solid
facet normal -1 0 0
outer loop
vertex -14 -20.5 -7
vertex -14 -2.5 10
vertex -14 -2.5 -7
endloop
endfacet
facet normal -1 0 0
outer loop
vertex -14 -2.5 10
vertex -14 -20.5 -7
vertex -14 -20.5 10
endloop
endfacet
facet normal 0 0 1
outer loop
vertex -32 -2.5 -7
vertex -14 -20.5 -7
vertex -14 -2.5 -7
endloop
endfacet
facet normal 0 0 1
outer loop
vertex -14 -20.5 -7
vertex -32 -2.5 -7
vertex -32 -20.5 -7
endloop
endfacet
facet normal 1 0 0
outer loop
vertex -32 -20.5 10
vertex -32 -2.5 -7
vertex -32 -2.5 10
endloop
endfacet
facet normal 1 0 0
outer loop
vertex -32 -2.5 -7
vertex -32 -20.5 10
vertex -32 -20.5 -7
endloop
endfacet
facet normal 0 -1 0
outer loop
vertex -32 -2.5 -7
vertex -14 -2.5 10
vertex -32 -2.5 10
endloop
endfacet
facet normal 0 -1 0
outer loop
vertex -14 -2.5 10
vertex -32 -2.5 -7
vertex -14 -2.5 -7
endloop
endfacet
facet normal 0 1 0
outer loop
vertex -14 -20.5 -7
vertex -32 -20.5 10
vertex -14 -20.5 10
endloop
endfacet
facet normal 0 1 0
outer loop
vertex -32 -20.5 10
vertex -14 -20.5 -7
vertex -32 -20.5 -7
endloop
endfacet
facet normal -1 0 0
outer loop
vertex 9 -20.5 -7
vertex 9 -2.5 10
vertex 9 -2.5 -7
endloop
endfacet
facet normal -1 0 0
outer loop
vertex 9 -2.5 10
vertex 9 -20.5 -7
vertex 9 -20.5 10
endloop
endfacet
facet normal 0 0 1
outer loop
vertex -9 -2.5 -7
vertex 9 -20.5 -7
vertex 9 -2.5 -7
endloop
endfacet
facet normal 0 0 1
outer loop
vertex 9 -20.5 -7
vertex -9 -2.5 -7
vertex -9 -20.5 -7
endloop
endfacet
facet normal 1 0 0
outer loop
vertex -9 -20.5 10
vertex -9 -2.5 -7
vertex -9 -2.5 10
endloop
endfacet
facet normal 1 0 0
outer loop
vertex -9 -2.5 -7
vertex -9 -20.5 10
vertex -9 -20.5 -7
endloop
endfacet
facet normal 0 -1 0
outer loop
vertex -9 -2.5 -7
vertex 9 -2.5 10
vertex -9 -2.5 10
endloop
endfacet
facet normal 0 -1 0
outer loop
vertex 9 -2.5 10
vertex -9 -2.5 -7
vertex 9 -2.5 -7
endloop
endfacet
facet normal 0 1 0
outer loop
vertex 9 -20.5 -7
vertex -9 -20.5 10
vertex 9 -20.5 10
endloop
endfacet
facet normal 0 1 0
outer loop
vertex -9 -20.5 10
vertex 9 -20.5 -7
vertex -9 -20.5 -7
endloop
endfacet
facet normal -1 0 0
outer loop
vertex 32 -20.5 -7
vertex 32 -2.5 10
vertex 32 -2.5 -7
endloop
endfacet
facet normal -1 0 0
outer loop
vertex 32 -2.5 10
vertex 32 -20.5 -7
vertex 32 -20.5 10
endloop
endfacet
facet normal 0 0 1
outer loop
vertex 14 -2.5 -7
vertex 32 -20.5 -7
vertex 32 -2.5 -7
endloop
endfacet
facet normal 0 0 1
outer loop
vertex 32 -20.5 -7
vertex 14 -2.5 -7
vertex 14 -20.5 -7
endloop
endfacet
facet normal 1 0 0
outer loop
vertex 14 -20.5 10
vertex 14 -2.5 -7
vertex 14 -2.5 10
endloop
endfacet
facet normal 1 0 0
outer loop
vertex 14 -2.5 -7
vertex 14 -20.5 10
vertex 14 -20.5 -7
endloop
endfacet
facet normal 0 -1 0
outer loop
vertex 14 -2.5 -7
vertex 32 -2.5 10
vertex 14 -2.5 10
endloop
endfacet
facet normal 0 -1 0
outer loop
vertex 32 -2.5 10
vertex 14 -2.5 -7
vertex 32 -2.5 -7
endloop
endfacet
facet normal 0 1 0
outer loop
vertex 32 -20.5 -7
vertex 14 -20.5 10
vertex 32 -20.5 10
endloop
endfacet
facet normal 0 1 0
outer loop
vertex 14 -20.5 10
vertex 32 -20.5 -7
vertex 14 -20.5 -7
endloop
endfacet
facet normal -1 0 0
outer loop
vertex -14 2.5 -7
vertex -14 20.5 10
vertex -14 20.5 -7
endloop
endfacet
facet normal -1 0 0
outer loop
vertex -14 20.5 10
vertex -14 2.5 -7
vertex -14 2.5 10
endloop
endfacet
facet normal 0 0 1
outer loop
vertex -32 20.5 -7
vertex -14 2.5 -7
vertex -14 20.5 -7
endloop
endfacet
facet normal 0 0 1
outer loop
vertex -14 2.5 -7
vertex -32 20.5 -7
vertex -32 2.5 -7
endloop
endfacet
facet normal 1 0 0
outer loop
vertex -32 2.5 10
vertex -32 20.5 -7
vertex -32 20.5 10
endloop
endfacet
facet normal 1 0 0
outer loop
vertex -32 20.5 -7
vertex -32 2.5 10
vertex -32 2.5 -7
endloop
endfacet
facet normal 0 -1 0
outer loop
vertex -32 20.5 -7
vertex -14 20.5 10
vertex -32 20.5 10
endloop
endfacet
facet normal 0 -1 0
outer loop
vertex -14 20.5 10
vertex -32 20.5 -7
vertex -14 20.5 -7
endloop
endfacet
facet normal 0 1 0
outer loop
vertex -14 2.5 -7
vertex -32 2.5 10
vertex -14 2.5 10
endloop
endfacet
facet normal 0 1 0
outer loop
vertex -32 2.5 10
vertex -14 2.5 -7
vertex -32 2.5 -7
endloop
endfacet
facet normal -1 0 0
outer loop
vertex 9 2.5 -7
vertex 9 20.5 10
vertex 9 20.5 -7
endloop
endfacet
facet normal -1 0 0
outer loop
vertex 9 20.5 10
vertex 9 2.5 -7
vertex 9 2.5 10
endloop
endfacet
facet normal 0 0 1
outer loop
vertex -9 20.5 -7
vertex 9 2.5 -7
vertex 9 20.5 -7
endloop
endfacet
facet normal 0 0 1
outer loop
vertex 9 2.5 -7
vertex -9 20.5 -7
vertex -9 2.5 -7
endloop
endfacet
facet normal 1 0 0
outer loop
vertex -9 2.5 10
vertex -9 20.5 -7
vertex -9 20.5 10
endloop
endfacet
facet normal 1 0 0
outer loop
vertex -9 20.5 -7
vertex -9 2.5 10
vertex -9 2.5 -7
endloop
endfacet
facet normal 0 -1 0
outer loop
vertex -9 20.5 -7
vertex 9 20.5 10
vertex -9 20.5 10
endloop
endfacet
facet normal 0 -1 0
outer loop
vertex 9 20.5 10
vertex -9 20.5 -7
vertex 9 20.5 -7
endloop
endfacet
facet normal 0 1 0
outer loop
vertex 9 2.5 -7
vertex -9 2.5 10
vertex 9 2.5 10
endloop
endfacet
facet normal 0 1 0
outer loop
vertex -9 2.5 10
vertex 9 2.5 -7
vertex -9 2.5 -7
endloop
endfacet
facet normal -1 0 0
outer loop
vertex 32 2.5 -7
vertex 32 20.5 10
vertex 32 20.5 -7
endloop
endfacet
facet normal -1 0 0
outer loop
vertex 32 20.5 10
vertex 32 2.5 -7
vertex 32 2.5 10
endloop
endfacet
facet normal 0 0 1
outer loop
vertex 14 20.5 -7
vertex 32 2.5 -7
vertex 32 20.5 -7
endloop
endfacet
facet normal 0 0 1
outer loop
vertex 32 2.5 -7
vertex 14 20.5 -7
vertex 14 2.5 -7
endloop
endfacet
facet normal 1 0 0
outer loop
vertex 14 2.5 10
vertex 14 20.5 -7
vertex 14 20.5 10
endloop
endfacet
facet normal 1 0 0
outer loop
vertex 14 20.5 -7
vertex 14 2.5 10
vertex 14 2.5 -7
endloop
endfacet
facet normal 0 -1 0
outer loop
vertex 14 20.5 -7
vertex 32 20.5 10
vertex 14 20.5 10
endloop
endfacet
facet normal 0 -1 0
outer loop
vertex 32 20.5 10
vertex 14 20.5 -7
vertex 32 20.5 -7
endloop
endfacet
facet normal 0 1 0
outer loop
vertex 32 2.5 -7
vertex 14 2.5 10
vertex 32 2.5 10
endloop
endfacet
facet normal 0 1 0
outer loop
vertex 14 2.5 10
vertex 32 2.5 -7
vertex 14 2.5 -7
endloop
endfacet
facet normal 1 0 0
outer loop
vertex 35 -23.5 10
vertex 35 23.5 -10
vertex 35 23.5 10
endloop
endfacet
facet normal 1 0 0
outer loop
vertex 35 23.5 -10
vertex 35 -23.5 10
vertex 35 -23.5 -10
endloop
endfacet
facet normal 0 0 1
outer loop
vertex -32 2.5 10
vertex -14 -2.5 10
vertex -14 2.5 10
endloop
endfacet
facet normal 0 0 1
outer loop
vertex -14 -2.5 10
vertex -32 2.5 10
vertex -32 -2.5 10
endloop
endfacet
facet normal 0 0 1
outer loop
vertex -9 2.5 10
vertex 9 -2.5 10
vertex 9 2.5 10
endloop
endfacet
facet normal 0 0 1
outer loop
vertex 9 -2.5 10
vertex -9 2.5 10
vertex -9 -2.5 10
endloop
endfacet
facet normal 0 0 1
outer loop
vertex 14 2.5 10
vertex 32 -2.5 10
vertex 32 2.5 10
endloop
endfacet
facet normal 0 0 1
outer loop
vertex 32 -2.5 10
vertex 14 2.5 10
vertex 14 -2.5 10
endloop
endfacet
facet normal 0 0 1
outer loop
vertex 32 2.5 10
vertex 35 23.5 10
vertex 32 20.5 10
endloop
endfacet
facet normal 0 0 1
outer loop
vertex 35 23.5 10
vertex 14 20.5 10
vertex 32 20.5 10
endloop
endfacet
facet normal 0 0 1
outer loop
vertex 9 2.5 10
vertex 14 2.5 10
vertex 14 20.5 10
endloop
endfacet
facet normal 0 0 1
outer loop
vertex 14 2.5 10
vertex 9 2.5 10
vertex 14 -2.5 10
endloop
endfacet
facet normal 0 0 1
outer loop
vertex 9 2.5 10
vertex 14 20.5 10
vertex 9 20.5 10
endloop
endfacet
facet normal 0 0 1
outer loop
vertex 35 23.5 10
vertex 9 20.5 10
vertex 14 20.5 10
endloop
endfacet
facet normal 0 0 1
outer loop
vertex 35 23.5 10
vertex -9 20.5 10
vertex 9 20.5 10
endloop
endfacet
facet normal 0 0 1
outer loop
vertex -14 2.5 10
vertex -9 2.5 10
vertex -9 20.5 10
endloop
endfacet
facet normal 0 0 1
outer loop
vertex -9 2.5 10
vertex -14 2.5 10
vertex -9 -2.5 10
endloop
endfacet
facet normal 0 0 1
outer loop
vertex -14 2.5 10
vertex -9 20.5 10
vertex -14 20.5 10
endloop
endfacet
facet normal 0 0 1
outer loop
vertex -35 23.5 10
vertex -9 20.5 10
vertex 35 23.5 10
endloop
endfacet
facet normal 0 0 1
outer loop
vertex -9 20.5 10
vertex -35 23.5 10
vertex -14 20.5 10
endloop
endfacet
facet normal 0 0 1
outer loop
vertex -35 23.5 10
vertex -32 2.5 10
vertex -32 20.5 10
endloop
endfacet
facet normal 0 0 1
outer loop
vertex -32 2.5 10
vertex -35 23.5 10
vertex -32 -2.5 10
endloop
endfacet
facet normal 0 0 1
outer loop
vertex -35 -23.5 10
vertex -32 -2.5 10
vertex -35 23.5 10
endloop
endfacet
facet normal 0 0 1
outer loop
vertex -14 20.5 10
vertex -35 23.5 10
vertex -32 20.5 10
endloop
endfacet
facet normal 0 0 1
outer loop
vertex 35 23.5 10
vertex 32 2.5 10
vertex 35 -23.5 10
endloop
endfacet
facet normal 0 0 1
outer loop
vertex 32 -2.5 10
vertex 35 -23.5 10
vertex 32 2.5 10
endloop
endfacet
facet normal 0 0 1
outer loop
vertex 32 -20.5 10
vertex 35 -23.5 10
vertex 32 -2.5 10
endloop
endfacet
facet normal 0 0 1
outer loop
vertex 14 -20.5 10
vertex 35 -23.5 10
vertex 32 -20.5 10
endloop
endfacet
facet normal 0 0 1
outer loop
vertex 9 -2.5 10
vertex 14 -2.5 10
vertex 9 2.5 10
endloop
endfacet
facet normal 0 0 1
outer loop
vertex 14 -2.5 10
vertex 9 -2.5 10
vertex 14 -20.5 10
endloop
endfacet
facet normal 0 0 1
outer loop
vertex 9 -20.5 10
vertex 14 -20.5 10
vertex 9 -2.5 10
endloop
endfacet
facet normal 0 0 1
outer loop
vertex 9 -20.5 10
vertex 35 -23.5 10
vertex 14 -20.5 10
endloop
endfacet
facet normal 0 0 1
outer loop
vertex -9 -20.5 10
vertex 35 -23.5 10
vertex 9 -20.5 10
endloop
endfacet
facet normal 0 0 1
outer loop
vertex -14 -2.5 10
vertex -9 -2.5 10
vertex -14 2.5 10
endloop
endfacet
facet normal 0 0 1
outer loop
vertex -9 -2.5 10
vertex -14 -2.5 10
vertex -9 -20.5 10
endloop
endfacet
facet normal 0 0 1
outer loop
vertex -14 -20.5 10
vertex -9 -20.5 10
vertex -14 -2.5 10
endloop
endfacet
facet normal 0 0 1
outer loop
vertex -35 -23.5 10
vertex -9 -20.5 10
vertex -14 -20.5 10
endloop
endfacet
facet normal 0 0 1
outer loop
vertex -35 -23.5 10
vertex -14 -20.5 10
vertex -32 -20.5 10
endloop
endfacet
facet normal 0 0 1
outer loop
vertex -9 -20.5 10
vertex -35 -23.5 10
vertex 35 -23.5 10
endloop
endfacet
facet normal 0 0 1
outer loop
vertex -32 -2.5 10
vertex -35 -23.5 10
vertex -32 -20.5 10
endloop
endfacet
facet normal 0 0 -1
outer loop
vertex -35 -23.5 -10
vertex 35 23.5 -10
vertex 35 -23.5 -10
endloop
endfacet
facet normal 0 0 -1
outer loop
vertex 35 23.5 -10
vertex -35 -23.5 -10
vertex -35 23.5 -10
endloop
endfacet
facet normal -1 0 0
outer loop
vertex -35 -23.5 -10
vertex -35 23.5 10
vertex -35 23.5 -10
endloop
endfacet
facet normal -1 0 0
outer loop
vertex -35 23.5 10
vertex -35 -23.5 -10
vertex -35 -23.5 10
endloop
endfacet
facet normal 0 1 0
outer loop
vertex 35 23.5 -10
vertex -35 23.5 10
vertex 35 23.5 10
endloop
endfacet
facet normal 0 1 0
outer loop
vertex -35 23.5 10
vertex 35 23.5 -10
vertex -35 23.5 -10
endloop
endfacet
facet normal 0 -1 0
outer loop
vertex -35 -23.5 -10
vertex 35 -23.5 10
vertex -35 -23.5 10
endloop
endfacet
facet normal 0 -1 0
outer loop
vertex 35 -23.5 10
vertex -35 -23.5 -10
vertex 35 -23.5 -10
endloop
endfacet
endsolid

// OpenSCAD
$fn = 32;

// ----------------------------------------------------------------------
// Pocket plate 70 x 47 x 20
// 2 x 3 pockets 18 mm square, 17 mm deep
// ----------------------------------------------------------------------

// --- parameters (mm) ---
thickness = 20;  // plate thickness
floor_t = 3;     // material left under each pocket
pocket = 18;     // pocket side length
pitch_x = 23;    // pocket pitch along X
pitch_y = 23;    // pocket pitch along Y
cols = 3;        // pockets per row
rows = 2;        // rows of pockets

// --- derived feature positions (mm) ---
depth = thickness - floor_t;        // = 17   pocket depth, down to the floor
span_x = (cols - 1) * pitch_x;      // = 46   distance between outer pockets
span_y = (rows - 1) * pitch_y;      // = 23   distance between outer pocket rows
origin_x = -span_x / 2;             // = -23   X of the first pocket
origin_y = -span_y / 2;             // = -11.5   Y of the first pocket
plate = [span_x + pocket + 6, span_y + pocket + 6, thickness];  // = [70, 47, 20]   overall size: pockets plus 3 mm of wall on each side
feature_centers = [
  [origin_x + 0 * pitch_x, origin_y + 0 * pitch_y],
  [origin_x + 1 * pitch_x, origin_y + 0 * pitch_y],
  [origin_x + 2 * pitch_x, origin_y + 0 * pitch_y],
  [origin_x + 0 * pitch_x, origin_y + 1 * pitch_y],
  [origin_x + 1 * pitch_x, origin_y + 1 * pitch_y],
  [origin_x + 2 * pitch_x, origin_y + 1 * pitch_y]
];   // pocket centres, used verbatim by the cutter loop

// plate outline, then one pocket per centre in feature_centers
difference() {
  cube(plate, center = true);
  for (centre = feature_centers)
    translate([centre[0] - pocket / 2, centre[1] - pocket / 2, plate[2] / 2 - depth])
      cube([pocket, pocket, depth + 1]);  // centred on the declared pocket centre
}
